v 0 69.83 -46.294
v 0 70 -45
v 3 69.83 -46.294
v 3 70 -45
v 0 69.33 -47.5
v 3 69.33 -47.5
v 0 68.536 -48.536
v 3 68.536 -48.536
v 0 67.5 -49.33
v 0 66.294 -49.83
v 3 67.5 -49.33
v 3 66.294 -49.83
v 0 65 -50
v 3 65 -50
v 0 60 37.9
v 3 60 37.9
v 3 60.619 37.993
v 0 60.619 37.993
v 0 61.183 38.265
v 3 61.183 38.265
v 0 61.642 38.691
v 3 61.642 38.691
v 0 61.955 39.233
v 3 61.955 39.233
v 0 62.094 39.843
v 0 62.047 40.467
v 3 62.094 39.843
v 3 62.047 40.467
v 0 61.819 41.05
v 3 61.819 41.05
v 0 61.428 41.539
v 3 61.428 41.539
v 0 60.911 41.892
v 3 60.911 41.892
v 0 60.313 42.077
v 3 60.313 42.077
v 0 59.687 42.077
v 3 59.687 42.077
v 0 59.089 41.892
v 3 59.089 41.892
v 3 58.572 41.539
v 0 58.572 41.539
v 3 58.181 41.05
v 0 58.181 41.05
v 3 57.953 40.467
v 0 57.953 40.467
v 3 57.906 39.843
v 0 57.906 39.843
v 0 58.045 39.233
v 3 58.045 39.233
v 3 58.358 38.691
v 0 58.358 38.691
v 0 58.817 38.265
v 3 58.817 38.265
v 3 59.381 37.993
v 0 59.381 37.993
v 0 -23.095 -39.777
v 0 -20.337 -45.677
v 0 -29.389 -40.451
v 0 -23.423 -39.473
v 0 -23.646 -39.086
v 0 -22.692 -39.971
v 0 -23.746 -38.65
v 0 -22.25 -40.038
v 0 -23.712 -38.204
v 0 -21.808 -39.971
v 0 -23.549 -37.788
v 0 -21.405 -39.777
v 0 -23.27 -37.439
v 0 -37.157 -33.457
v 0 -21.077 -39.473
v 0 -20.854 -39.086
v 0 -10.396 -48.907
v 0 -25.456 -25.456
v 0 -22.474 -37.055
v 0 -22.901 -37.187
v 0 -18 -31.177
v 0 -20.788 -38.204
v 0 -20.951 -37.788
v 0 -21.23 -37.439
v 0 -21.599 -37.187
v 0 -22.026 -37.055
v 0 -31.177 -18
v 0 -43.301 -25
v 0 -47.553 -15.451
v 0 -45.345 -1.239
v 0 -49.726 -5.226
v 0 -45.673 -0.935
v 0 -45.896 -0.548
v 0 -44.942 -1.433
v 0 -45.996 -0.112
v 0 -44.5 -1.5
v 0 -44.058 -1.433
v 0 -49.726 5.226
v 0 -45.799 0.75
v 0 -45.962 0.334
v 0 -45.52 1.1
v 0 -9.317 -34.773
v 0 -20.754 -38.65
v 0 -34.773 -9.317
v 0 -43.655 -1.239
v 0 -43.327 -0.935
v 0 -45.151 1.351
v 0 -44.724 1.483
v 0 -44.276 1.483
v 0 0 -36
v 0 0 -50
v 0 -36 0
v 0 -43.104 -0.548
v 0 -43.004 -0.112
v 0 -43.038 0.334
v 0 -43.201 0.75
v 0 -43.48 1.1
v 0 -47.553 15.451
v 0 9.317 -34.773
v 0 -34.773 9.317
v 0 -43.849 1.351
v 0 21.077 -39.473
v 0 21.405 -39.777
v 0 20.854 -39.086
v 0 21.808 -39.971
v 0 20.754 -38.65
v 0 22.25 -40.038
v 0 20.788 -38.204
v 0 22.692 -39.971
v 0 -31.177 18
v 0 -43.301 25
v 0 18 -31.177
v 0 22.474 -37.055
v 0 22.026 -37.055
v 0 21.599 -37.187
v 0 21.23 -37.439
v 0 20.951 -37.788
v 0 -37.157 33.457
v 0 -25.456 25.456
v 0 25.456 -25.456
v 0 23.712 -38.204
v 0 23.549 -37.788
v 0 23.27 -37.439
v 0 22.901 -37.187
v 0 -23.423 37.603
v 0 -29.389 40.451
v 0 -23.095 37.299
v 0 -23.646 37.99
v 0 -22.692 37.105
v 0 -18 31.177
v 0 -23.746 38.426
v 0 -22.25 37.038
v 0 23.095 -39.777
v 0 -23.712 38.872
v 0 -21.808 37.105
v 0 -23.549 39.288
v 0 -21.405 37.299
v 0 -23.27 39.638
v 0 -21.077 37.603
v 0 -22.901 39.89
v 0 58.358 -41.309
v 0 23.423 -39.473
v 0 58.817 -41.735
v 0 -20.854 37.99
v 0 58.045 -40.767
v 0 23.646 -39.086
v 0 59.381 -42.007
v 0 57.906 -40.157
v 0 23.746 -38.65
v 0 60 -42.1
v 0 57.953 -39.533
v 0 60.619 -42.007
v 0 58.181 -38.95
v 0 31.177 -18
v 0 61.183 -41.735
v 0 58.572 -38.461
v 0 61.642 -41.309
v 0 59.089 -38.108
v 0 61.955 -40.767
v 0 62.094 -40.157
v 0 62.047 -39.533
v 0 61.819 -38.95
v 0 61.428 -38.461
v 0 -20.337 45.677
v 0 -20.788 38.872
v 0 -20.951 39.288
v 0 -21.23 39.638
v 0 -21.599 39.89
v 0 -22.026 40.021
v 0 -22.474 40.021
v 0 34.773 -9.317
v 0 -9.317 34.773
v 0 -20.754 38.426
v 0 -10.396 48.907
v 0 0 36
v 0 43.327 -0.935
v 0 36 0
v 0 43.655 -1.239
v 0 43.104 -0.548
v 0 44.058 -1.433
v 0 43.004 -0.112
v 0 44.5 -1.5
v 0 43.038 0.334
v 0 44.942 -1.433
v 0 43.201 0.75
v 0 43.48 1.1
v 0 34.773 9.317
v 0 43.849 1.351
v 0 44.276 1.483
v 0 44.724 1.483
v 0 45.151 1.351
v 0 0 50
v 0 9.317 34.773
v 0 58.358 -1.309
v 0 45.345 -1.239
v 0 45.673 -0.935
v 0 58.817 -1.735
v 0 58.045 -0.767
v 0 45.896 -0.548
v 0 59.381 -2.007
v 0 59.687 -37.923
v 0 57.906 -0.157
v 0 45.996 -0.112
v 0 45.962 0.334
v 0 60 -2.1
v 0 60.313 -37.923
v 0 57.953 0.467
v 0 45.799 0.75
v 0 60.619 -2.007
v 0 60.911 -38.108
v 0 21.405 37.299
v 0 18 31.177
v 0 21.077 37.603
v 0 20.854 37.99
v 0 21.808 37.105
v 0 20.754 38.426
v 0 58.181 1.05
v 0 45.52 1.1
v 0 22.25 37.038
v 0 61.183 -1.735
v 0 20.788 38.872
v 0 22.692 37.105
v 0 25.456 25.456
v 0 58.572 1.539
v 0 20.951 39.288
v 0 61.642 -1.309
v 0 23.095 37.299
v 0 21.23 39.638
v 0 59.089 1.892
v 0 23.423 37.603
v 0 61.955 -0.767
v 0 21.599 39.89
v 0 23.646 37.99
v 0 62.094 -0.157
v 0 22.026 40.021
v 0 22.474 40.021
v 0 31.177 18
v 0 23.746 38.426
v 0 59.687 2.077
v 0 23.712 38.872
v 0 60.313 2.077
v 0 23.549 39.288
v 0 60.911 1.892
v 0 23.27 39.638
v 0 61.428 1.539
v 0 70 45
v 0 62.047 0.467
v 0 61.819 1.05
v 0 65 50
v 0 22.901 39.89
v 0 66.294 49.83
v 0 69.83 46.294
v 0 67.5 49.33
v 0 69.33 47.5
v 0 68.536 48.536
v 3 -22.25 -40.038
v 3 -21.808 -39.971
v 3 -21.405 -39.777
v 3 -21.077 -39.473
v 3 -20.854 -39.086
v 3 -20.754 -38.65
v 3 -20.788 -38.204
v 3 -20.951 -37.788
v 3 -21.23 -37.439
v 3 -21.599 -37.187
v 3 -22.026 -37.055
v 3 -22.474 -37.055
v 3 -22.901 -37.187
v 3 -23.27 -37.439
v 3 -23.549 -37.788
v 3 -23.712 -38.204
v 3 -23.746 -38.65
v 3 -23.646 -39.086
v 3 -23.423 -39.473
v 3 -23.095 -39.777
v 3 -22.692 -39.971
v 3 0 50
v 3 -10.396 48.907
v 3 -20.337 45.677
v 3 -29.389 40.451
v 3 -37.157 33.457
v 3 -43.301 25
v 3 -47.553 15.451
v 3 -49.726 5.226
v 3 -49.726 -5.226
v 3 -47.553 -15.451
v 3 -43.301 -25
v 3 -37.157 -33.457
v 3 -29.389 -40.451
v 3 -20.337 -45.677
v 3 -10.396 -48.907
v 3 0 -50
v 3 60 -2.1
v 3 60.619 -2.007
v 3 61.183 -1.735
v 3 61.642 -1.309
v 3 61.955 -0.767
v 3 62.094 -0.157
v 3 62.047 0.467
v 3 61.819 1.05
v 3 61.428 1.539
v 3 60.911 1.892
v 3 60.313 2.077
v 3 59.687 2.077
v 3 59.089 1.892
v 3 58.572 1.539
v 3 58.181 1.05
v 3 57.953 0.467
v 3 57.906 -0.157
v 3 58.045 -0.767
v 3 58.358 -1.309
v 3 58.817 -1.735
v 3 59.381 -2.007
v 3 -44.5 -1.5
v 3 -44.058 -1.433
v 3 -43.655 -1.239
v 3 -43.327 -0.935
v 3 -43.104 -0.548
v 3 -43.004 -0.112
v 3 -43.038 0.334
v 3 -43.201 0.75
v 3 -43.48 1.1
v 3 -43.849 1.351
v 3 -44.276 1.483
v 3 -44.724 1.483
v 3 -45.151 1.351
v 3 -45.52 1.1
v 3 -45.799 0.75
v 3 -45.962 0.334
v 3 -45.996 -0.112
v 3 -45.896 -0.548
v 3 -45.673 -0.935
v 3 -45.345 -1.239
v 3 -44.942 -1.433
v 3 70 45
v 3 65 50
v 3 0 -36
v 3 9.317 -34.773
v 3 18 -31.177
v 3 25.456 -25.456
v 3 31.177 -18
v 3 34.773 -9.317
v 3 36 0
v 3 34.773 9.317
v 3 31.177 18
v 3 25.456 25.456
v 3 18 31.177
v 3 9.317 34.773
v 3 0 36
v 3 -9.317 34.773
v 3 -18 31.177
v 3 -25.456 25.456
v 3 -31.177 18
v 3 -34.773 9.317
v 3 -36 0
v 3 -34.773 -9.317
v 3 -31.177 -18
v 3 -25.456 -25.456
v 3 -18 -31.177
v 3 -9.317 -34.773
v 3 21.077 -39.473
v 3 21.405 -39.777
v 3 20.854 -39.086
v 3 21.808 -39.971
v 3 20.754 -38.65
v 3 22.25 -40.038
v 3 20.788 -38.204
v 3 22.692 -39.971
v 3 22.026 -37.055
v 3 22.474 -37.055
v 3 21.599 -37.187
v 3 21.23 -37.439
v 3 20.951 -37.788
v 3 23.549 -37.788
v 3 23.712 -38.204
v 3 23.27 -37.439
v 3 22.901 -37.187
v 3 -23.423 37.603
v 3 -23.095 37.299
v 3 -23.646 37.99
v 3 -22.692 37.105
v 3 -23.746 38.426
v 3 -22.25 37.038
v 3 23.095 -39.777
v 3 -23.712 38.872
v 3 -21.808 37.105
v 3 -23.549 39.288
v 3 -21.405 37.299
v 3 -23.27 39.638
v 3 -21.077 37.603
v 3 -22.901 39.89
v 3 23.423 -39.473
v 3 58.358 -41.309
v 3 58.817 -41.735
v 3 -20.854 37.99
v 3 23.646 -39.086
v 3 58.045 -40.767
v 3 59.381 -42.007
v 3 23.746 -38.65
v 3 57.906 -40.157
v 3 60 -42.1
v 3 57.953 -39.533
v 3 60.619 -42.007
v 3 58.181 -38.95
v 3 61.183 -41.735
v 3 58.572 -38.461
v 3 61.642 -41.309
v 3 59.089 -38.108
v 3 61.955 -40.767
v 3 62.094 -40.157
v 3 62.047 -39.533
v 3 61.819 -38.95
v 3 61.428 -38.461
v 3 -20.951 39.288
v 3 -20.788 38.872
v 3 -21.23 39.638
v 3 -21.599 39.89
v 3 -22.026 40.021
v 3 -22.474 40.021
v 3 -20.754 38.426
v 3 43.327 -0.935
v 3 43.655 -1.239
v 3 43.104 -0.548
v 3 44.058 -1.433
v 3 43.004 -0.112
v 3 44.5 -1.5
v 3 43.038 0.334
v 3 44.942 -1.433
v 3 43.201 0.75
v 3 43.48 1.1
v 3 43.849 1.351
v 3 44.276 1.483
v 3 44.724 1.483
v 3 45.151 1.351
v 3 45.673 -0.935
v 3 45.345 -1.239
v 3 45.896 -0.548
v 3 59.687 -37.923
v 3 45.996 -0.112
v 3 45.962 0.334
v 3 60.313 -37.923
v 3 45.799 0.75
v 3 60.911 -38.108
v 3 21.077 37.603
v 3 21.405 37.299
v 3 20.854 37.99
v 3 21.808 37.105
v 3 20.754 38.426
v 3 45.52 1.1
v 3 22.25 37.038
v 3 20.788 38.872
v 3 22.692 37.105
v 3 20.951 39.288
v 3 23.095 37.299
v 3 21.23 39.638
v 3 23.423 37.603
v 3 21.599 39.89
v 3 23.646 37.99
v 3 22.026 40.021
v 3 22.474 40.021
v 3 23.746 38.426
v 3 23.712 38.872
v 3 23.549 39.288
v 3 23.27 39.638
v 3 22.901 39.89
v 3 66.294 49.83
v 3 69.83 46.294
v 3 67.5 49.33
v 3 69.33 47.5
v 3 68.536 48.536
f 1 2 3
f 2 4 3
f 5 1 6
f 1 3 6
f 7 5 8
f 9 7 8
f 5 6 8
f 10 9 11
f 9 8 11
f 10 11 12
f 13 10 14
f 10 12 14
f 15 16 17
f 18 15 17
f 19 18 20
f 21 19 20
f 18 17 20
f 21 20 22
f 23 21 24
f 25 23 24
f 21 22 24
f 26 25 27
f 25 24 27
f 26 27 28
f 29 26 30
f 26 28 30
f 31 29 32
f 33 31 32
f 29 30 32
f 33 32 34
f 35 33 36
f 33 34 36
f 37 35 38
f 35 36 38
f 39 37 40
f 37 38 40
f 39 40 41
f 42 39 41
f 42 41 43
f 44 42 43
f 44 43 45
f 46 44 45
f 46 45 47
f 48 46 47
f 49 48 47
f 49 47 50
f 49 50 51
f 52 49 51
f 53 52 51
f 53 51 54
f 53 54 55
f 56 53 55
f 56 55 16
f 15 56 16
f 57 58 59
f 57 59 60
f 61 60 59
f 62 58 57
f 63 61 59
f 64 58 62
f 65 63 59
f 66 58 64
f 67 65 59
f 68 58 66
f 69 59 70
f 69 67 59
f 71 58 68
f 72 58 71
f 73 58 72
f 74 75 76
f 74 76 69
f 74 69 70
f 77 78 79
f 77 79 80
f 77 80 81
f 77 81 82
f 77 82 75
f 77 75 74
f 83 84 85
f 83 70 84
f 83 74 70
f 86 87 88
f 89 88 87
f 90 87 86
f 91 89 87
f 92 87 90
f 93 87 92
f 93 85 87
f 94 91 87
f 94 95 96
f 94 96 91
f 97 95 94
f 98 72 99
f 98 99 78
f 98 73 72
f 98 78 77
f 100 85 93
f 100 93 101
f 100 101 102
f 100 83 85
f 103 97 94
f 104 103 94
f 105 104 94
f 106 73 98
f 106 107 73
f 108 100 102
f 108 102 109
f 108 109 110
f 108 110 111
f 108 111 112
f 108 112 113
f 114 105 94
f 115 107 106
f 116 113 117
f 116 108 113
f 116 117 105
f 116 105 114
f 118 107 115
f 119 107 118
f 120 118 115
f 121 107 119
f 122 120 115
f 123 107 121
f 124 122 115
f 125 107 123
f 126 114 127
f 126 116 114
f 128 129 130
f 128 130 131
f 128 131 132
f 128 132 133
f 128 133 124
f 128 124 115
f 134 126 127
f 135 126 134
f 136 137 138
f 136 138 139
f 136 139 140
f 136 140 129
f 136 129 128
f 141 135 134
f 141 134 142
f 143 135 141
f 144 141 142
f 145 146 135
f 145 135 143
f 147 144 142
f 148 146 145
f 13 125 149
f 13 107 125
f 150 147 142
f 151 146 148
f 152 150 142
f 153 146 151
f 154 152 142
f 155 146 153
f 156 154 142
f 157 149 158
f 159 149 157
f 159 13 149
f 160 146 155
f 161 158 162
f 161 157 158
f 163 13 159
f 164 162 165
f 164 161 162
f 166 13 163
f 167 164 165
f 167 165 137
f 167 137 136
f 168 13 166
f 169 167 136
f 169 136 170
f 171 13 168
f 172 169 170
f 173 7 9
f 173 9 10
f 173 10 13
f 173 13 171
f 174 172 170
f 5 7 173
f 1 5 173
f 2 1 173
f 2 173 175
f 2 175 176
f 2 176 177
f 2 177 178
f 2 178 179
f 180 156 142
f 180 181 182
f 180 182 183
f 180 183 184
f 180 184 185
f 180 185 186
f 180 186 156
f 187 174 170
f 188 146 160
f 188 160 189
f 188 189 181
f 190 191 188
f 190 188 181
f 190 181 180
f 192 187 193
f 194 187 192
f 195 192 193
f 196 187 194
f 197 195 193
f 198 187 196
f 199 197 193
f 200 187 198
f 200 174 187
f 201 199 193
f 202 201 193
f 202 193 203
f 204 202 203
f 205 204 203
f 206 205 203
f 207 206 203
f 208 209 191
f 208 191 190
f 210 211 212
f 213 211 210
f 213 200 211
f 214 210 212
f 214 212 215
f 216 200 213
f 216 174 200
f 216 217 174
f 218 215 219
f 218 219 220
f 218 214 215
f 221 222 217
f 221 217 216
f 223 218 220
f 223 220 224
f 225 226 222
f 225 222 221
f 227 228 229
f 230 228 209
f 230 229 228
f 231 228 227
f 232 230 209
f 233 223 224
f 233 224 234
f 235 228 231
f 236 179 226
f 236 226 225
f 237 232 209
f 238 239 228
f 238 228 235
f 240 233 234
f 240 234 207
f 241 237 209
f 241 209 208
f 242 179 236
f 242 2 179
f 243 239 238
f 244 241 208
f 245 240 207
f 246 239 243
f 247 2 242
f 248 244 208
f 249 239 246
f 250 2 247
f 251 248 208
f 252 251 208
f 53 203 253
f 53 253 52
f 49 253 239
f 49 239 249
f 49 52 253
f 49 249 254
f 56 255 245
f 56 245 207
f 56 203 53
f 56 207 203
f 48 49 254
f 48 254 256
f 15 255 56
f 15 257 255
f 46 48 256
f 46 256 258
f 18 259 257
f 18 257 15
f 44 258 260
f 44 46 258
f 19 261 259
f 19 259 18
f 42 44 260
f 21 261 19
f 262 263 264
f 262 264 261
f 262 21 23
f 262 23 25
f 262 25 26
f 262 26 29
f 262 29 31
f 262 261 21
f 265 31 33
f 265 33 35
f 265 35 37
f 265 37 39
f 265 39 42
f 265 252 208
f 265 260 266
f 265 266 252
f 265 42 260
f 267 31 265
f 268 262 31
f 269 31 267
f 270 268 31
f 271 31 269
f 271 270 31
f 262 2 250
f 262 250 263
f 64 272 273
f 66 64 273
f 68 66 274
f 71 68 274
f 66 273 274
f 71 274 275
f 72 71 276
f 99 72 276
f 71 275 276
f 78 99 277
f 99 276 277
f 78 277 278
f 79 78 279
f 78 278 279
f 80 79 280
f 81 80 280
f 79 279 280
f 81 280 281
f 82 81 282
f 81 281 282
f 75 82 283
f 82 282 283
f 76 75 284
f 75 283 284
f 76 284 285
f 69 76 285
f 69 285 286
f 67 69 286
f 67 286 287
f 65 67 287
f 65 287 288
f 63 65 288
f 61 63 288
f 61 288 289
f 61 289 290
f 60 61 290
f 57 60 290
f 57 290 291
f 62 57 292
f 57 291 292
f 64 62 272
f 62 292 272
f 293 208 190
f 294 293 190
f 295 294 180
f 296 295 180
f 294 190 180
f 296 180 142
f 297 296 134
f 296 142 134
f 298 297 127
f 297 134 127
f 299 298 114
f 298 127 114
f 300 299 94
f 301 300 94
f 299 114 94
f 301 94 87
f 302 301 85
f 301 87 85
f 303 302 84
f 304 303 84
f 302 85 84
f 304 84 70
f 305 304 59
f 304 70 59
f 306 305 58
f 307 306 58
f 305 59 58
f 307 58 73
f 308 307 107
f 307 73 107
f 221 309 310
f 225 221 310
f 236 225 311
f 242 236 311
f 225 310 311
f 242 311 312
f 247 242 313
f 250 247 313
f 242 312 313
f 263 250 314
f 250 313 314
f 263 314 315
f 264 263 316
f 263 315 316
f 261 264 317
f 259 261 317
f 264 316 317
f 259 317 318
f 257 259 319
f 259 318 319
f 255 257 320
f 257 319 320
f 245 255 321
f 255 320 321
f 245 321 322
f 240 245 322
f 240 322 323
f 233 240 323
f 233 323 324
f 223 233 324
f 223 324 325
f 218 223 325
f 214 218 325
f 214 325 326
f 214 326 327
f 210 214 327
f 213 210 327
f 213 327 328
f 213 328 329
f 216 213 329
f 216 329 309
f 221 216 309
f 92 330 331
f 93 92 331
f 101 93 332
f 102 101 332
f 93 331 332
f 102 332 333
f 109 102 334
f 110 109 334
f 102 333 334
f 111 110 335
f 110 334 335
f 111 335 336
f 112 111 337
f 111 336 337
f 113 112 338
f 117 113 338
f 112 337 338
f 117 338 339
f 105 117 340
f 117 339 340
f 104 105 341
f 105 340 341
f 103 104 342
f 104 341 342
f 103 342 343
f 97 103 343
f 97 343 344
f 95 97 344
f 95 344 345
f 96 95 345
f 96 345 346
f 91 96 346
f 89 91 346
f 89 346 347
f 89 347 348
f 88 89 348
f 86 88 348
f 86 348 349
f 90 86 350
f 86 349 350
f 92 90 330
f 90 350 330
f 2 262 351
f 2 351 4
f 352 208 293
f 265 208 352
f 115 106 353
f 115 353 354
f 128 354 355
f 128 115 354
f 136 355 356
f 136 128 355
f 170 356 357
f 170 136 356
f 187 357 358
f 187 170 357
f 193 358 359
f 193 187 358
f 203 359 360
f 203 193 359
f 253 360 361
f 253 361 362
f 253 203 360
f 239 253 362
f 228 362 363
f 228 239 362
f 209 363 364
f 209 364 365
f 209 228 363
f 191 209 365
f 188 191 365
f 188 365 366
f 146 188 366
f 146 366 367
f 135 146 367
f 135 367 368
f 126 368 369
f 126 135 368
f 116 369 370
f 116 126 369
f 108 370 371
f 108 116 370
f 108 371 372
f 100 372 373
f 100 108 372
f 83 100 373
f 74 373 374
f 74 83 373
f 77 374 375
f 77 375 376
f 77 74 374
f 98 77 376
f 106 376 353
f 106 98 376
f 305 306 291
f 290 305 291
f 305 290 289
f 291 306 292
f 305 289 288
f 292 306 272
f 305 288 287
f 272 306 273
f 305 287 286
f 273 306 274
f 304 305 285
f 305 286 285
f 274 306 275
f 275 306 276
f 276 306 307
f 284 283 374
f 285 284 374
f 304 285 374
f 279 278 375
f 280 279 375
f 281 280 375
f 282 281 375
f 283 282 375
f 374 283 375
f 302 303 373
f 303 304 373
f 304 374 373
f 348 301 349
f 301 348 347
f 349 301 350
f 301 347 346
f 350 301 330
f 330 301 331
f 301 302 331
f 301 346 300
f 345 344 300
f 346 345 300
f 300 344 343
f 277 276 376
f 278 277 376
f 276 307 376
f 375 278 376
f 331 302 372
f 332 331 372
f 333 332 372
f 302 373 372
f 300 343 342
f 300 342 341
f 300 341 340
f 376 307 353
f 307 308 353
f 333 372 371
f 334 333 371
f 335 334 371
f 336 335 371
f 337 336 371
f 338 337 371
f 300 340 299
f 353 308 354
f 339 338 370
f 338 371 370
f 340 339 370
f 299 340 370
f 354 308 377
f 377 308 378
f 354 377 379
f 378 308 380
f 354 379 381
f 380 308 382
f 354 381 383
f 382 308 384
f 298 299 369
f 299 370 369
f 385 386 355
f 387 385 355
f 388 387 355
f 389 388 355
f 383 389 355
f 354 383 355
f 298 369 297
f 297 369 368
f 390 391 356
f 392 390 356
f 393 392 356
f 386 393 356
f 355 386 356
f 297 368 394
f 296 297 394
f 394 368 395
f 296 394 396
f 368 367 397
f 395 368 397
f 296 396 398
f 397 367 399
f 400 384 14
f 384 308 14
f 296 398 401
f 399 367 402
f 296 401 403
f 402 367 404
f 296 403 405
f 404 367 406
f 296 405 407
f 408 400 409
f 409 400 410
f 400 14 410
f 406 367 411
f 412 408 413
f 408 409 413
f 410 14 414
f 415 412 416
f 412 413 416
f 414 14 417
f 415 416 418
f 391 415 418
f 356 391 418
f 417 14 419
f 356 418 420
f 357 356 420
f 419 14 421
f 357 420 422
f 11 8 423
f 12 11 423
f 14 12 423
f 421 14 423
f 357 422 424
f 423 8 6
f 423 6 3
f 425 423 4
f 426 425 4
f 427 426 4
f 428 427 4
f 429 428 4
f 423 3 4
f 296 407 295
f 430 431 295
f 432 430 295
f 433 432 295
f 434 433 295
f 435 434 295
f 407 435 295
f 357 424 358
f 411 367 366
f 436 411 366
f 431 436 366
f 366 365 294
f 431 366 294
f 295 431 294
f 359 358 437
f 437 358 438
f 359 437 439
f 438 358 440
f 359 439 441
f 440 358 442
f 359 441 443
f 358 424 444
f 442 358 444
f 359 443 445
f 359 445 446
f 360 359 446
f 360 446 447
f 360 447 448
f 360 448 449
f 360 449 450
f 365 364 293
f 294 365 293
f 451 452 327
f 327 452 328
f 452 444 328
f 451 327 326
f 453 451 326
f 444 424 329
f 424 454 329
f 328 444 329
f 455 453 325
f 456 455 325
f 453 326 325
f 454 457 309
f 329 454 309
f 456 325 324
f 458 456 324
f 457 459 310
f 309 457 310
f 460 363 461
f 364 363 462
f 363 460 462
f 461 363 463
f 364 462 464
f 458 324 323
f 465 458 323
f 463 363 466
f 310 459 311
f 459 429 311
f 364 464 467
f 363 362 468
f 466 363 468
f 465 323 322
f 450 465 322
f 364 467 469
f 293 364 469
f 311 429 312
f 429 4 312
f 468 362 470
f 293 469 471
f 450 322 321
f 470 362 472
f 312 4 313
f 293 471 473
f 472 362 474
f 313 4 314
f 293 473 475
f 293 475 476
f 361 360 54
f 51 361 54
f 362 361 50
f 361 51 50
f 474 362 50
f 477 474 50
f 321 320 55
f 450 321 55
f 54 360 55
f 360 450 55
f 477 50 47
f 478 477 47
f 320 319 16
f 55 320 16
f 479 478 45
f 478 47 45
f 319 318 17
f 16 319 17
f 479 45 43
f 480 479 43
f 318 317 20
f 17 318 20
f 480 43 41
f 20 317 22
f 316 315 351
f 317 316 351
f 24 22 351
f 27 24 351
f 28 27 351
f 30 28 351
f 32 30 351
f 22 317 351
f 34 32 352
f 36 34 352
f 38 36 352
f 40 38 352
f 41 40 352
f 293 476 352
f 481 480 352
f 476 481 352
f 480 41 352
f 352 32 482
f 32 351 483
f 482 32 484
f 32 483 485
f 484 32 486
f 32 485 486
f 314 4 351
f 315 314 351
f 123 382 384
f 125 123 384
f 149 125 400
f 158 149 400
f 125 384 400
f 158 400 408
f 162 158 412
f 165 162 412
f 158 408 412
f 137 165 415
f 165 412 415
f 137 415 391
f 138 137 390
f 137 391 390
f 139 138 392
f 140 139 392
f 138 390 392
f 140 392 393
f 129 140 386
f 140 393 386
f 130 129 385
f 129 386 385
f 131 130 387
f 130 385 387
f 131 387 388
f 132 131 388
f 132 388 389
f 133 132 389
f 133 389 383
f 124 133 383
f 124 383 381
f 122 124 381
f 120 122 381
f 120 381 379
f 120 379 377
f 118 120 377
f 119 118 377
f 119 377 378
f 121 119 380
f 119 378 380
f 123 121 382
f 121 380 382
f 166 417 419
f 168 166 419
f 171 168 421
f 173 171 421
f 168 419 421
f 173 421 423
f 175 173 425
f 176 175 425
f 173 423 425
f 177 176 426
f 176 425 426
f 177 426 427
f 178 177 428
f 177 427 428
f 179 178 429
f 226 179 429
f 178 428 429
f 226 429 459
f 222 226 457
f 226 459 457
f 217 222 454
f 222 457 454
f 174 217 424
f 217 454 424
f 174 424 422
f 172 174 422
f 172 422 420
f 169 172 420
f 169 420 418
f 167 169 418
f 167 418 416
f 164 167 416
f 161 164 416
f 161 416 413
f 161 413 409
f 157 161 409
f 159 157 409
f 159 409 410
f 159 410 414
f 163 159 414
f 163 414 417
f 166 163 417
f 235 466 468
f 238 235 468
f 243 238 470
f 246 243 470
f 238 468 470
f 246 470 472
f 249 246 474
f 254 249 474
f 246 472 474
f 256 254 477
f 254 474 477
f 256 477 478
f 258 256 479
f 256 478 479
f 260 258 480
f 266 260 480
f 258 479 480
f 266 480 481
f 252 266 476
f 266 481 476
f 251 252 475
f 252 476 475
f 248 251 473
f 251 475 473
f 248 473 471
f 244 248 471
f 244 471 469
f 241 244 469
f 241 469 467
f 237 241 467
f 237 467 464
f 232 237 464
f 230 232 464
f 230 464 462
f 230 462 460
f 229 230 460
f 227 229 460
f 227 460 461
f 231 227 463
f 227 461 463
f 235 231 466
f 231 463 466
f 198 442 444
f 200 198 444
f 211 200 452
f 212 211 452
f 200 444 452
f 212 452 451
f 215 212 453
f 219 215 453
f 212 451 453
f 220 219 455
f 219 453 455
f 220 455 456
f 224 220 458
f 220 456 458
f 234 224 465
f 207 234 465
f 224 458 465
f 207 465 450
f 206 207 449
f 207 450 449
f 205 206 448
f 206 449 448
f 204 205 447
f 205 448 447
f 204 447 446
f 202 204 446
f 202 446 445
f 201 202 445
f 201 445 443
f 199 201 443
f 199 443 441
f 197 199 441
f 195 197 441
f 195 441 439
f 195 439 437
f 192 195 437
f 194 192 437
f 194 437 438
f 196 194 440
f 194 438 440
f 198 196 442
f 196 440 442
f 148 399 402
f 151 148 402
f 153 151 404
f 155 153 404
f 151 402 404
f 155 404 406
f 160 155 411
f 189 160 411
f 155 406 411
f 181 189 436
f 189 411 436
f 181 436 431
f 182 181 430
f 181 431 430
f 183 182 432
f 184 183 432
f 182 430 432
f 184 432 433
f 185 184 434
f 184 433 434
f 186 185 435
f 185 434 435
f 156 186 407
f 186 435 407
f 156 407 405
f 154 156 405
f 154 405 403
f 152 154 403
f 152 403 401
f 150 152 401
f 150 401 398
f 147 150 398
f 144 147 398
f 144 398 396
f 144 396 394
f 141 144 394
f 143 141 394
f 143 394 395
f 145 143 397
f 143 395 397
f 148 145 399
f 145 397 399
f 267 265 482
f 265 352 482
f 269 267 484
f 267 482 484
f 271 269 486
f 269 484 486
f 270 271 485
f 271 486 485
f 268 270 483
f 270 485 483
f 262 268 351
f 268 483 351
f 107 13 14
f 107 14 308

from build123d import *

# Parameters (mm, degrees)
SKETCH_1_R          = 50
SKETCH_1_R_2        = 36
EXTRUDE_1_DEPTH     = 3
EXTRUDE_START       = -3
EXTRUDE_2_DEPTH     = 3
SKETCH_3_R          = 1.5
CUT_EXTRUDE_1_DEPTH = 3
SKETCH_4_R          = 2.1
CUT_EXTRUDE_2_DEPTH = 87.075548212
FILLET_2_R          = 5


with BuildPart() as part:
    # 草图1 → 凸台-拉伸1 (new body)
    with BuildSketch(Plane(origin=(0, 0, 0), x_dir=(0, 0, -1), z_dir=(1, 0, 0))):
        Circle(SKETCH_1_R)
        Circle(SKETCH_1_R_2, mode=Mode.SUBTRACT)
    extrude(amount=EXTRUDE_1_DEPTH)

    # 草图2 → 凸台-拉伸2 (add)
    with BuildSketch(Plane(origin=(3, 0, 0), x_dir=(0, 0, -1), z_dir=(1, 0, 0)).offset(EXTRUDE_START)):
        with BuildLine():
            Line((-50, 0), (-50, 70))
            Line((-50, 70), (50, 70))
            Line((50, 70), (50, 0))
            ThreePointArc((50, 0), (0, 50), (-50, 0))
        make_face()
    extrude(amount=EXTRUDE_2_DEPTH)

    # 草图3 → 切除-拉伸1 (cut)
    with BuildSketch(Plane(origin=(3, 0, 0), x_dir=(0, 0, -1), z_dir=(1, 0, 0))):
        with Locations((0, 44.5)):
            Circle(SKETCH_3_R)
        with Locations((38.538130468, 22.25)):
            Circle(SKETCH_3_R)
        with Locations((38.538130468, -22.25)):
            Circle(SKETCH_3_R)
        with Locations((0, -44.5)):
            Circle(SKETCH_3_R)
        with Locations((-38.538130468, -22.25)):
            Circle(SKETCH_3_R)
        with Locations((-38.538130468, 22.25)):
            Circle(SKETCH_3_R)
    extrude(amount=-CUT_EXTRUDE_1_DEPTH, mode=Mode.SUBTRACT)

    # 草图4 → 切除-拉伸2 (cut, through all)
    with BuildSketch(Plane(origin=(3, 0, 0), x_dir=(0, 0, -1), z_dir=(1, 0, 0))):
        with Locations((-40, 60)):
            Circle(SKETCH_4_R)
        with Locations((0, 60)):
            Circle(SKETCH_4_R)
        with Locations((40, 60)):
            Circle(SKETCH_4_R)
    extrude(amount=-CUT_EXTRUDE_2_DEPTH, mode=Mode.SUBTRACT)

    # 圆角2
    fillet_2_edges = [part.edges().sort_by_distance(p)[0] for p in [
        (1.5, 70, 50),
        (1.5, 70, -50),
    ]]
    fillet(fillet_2_edges, radius=FILLET_2_R)


solid = part.part
